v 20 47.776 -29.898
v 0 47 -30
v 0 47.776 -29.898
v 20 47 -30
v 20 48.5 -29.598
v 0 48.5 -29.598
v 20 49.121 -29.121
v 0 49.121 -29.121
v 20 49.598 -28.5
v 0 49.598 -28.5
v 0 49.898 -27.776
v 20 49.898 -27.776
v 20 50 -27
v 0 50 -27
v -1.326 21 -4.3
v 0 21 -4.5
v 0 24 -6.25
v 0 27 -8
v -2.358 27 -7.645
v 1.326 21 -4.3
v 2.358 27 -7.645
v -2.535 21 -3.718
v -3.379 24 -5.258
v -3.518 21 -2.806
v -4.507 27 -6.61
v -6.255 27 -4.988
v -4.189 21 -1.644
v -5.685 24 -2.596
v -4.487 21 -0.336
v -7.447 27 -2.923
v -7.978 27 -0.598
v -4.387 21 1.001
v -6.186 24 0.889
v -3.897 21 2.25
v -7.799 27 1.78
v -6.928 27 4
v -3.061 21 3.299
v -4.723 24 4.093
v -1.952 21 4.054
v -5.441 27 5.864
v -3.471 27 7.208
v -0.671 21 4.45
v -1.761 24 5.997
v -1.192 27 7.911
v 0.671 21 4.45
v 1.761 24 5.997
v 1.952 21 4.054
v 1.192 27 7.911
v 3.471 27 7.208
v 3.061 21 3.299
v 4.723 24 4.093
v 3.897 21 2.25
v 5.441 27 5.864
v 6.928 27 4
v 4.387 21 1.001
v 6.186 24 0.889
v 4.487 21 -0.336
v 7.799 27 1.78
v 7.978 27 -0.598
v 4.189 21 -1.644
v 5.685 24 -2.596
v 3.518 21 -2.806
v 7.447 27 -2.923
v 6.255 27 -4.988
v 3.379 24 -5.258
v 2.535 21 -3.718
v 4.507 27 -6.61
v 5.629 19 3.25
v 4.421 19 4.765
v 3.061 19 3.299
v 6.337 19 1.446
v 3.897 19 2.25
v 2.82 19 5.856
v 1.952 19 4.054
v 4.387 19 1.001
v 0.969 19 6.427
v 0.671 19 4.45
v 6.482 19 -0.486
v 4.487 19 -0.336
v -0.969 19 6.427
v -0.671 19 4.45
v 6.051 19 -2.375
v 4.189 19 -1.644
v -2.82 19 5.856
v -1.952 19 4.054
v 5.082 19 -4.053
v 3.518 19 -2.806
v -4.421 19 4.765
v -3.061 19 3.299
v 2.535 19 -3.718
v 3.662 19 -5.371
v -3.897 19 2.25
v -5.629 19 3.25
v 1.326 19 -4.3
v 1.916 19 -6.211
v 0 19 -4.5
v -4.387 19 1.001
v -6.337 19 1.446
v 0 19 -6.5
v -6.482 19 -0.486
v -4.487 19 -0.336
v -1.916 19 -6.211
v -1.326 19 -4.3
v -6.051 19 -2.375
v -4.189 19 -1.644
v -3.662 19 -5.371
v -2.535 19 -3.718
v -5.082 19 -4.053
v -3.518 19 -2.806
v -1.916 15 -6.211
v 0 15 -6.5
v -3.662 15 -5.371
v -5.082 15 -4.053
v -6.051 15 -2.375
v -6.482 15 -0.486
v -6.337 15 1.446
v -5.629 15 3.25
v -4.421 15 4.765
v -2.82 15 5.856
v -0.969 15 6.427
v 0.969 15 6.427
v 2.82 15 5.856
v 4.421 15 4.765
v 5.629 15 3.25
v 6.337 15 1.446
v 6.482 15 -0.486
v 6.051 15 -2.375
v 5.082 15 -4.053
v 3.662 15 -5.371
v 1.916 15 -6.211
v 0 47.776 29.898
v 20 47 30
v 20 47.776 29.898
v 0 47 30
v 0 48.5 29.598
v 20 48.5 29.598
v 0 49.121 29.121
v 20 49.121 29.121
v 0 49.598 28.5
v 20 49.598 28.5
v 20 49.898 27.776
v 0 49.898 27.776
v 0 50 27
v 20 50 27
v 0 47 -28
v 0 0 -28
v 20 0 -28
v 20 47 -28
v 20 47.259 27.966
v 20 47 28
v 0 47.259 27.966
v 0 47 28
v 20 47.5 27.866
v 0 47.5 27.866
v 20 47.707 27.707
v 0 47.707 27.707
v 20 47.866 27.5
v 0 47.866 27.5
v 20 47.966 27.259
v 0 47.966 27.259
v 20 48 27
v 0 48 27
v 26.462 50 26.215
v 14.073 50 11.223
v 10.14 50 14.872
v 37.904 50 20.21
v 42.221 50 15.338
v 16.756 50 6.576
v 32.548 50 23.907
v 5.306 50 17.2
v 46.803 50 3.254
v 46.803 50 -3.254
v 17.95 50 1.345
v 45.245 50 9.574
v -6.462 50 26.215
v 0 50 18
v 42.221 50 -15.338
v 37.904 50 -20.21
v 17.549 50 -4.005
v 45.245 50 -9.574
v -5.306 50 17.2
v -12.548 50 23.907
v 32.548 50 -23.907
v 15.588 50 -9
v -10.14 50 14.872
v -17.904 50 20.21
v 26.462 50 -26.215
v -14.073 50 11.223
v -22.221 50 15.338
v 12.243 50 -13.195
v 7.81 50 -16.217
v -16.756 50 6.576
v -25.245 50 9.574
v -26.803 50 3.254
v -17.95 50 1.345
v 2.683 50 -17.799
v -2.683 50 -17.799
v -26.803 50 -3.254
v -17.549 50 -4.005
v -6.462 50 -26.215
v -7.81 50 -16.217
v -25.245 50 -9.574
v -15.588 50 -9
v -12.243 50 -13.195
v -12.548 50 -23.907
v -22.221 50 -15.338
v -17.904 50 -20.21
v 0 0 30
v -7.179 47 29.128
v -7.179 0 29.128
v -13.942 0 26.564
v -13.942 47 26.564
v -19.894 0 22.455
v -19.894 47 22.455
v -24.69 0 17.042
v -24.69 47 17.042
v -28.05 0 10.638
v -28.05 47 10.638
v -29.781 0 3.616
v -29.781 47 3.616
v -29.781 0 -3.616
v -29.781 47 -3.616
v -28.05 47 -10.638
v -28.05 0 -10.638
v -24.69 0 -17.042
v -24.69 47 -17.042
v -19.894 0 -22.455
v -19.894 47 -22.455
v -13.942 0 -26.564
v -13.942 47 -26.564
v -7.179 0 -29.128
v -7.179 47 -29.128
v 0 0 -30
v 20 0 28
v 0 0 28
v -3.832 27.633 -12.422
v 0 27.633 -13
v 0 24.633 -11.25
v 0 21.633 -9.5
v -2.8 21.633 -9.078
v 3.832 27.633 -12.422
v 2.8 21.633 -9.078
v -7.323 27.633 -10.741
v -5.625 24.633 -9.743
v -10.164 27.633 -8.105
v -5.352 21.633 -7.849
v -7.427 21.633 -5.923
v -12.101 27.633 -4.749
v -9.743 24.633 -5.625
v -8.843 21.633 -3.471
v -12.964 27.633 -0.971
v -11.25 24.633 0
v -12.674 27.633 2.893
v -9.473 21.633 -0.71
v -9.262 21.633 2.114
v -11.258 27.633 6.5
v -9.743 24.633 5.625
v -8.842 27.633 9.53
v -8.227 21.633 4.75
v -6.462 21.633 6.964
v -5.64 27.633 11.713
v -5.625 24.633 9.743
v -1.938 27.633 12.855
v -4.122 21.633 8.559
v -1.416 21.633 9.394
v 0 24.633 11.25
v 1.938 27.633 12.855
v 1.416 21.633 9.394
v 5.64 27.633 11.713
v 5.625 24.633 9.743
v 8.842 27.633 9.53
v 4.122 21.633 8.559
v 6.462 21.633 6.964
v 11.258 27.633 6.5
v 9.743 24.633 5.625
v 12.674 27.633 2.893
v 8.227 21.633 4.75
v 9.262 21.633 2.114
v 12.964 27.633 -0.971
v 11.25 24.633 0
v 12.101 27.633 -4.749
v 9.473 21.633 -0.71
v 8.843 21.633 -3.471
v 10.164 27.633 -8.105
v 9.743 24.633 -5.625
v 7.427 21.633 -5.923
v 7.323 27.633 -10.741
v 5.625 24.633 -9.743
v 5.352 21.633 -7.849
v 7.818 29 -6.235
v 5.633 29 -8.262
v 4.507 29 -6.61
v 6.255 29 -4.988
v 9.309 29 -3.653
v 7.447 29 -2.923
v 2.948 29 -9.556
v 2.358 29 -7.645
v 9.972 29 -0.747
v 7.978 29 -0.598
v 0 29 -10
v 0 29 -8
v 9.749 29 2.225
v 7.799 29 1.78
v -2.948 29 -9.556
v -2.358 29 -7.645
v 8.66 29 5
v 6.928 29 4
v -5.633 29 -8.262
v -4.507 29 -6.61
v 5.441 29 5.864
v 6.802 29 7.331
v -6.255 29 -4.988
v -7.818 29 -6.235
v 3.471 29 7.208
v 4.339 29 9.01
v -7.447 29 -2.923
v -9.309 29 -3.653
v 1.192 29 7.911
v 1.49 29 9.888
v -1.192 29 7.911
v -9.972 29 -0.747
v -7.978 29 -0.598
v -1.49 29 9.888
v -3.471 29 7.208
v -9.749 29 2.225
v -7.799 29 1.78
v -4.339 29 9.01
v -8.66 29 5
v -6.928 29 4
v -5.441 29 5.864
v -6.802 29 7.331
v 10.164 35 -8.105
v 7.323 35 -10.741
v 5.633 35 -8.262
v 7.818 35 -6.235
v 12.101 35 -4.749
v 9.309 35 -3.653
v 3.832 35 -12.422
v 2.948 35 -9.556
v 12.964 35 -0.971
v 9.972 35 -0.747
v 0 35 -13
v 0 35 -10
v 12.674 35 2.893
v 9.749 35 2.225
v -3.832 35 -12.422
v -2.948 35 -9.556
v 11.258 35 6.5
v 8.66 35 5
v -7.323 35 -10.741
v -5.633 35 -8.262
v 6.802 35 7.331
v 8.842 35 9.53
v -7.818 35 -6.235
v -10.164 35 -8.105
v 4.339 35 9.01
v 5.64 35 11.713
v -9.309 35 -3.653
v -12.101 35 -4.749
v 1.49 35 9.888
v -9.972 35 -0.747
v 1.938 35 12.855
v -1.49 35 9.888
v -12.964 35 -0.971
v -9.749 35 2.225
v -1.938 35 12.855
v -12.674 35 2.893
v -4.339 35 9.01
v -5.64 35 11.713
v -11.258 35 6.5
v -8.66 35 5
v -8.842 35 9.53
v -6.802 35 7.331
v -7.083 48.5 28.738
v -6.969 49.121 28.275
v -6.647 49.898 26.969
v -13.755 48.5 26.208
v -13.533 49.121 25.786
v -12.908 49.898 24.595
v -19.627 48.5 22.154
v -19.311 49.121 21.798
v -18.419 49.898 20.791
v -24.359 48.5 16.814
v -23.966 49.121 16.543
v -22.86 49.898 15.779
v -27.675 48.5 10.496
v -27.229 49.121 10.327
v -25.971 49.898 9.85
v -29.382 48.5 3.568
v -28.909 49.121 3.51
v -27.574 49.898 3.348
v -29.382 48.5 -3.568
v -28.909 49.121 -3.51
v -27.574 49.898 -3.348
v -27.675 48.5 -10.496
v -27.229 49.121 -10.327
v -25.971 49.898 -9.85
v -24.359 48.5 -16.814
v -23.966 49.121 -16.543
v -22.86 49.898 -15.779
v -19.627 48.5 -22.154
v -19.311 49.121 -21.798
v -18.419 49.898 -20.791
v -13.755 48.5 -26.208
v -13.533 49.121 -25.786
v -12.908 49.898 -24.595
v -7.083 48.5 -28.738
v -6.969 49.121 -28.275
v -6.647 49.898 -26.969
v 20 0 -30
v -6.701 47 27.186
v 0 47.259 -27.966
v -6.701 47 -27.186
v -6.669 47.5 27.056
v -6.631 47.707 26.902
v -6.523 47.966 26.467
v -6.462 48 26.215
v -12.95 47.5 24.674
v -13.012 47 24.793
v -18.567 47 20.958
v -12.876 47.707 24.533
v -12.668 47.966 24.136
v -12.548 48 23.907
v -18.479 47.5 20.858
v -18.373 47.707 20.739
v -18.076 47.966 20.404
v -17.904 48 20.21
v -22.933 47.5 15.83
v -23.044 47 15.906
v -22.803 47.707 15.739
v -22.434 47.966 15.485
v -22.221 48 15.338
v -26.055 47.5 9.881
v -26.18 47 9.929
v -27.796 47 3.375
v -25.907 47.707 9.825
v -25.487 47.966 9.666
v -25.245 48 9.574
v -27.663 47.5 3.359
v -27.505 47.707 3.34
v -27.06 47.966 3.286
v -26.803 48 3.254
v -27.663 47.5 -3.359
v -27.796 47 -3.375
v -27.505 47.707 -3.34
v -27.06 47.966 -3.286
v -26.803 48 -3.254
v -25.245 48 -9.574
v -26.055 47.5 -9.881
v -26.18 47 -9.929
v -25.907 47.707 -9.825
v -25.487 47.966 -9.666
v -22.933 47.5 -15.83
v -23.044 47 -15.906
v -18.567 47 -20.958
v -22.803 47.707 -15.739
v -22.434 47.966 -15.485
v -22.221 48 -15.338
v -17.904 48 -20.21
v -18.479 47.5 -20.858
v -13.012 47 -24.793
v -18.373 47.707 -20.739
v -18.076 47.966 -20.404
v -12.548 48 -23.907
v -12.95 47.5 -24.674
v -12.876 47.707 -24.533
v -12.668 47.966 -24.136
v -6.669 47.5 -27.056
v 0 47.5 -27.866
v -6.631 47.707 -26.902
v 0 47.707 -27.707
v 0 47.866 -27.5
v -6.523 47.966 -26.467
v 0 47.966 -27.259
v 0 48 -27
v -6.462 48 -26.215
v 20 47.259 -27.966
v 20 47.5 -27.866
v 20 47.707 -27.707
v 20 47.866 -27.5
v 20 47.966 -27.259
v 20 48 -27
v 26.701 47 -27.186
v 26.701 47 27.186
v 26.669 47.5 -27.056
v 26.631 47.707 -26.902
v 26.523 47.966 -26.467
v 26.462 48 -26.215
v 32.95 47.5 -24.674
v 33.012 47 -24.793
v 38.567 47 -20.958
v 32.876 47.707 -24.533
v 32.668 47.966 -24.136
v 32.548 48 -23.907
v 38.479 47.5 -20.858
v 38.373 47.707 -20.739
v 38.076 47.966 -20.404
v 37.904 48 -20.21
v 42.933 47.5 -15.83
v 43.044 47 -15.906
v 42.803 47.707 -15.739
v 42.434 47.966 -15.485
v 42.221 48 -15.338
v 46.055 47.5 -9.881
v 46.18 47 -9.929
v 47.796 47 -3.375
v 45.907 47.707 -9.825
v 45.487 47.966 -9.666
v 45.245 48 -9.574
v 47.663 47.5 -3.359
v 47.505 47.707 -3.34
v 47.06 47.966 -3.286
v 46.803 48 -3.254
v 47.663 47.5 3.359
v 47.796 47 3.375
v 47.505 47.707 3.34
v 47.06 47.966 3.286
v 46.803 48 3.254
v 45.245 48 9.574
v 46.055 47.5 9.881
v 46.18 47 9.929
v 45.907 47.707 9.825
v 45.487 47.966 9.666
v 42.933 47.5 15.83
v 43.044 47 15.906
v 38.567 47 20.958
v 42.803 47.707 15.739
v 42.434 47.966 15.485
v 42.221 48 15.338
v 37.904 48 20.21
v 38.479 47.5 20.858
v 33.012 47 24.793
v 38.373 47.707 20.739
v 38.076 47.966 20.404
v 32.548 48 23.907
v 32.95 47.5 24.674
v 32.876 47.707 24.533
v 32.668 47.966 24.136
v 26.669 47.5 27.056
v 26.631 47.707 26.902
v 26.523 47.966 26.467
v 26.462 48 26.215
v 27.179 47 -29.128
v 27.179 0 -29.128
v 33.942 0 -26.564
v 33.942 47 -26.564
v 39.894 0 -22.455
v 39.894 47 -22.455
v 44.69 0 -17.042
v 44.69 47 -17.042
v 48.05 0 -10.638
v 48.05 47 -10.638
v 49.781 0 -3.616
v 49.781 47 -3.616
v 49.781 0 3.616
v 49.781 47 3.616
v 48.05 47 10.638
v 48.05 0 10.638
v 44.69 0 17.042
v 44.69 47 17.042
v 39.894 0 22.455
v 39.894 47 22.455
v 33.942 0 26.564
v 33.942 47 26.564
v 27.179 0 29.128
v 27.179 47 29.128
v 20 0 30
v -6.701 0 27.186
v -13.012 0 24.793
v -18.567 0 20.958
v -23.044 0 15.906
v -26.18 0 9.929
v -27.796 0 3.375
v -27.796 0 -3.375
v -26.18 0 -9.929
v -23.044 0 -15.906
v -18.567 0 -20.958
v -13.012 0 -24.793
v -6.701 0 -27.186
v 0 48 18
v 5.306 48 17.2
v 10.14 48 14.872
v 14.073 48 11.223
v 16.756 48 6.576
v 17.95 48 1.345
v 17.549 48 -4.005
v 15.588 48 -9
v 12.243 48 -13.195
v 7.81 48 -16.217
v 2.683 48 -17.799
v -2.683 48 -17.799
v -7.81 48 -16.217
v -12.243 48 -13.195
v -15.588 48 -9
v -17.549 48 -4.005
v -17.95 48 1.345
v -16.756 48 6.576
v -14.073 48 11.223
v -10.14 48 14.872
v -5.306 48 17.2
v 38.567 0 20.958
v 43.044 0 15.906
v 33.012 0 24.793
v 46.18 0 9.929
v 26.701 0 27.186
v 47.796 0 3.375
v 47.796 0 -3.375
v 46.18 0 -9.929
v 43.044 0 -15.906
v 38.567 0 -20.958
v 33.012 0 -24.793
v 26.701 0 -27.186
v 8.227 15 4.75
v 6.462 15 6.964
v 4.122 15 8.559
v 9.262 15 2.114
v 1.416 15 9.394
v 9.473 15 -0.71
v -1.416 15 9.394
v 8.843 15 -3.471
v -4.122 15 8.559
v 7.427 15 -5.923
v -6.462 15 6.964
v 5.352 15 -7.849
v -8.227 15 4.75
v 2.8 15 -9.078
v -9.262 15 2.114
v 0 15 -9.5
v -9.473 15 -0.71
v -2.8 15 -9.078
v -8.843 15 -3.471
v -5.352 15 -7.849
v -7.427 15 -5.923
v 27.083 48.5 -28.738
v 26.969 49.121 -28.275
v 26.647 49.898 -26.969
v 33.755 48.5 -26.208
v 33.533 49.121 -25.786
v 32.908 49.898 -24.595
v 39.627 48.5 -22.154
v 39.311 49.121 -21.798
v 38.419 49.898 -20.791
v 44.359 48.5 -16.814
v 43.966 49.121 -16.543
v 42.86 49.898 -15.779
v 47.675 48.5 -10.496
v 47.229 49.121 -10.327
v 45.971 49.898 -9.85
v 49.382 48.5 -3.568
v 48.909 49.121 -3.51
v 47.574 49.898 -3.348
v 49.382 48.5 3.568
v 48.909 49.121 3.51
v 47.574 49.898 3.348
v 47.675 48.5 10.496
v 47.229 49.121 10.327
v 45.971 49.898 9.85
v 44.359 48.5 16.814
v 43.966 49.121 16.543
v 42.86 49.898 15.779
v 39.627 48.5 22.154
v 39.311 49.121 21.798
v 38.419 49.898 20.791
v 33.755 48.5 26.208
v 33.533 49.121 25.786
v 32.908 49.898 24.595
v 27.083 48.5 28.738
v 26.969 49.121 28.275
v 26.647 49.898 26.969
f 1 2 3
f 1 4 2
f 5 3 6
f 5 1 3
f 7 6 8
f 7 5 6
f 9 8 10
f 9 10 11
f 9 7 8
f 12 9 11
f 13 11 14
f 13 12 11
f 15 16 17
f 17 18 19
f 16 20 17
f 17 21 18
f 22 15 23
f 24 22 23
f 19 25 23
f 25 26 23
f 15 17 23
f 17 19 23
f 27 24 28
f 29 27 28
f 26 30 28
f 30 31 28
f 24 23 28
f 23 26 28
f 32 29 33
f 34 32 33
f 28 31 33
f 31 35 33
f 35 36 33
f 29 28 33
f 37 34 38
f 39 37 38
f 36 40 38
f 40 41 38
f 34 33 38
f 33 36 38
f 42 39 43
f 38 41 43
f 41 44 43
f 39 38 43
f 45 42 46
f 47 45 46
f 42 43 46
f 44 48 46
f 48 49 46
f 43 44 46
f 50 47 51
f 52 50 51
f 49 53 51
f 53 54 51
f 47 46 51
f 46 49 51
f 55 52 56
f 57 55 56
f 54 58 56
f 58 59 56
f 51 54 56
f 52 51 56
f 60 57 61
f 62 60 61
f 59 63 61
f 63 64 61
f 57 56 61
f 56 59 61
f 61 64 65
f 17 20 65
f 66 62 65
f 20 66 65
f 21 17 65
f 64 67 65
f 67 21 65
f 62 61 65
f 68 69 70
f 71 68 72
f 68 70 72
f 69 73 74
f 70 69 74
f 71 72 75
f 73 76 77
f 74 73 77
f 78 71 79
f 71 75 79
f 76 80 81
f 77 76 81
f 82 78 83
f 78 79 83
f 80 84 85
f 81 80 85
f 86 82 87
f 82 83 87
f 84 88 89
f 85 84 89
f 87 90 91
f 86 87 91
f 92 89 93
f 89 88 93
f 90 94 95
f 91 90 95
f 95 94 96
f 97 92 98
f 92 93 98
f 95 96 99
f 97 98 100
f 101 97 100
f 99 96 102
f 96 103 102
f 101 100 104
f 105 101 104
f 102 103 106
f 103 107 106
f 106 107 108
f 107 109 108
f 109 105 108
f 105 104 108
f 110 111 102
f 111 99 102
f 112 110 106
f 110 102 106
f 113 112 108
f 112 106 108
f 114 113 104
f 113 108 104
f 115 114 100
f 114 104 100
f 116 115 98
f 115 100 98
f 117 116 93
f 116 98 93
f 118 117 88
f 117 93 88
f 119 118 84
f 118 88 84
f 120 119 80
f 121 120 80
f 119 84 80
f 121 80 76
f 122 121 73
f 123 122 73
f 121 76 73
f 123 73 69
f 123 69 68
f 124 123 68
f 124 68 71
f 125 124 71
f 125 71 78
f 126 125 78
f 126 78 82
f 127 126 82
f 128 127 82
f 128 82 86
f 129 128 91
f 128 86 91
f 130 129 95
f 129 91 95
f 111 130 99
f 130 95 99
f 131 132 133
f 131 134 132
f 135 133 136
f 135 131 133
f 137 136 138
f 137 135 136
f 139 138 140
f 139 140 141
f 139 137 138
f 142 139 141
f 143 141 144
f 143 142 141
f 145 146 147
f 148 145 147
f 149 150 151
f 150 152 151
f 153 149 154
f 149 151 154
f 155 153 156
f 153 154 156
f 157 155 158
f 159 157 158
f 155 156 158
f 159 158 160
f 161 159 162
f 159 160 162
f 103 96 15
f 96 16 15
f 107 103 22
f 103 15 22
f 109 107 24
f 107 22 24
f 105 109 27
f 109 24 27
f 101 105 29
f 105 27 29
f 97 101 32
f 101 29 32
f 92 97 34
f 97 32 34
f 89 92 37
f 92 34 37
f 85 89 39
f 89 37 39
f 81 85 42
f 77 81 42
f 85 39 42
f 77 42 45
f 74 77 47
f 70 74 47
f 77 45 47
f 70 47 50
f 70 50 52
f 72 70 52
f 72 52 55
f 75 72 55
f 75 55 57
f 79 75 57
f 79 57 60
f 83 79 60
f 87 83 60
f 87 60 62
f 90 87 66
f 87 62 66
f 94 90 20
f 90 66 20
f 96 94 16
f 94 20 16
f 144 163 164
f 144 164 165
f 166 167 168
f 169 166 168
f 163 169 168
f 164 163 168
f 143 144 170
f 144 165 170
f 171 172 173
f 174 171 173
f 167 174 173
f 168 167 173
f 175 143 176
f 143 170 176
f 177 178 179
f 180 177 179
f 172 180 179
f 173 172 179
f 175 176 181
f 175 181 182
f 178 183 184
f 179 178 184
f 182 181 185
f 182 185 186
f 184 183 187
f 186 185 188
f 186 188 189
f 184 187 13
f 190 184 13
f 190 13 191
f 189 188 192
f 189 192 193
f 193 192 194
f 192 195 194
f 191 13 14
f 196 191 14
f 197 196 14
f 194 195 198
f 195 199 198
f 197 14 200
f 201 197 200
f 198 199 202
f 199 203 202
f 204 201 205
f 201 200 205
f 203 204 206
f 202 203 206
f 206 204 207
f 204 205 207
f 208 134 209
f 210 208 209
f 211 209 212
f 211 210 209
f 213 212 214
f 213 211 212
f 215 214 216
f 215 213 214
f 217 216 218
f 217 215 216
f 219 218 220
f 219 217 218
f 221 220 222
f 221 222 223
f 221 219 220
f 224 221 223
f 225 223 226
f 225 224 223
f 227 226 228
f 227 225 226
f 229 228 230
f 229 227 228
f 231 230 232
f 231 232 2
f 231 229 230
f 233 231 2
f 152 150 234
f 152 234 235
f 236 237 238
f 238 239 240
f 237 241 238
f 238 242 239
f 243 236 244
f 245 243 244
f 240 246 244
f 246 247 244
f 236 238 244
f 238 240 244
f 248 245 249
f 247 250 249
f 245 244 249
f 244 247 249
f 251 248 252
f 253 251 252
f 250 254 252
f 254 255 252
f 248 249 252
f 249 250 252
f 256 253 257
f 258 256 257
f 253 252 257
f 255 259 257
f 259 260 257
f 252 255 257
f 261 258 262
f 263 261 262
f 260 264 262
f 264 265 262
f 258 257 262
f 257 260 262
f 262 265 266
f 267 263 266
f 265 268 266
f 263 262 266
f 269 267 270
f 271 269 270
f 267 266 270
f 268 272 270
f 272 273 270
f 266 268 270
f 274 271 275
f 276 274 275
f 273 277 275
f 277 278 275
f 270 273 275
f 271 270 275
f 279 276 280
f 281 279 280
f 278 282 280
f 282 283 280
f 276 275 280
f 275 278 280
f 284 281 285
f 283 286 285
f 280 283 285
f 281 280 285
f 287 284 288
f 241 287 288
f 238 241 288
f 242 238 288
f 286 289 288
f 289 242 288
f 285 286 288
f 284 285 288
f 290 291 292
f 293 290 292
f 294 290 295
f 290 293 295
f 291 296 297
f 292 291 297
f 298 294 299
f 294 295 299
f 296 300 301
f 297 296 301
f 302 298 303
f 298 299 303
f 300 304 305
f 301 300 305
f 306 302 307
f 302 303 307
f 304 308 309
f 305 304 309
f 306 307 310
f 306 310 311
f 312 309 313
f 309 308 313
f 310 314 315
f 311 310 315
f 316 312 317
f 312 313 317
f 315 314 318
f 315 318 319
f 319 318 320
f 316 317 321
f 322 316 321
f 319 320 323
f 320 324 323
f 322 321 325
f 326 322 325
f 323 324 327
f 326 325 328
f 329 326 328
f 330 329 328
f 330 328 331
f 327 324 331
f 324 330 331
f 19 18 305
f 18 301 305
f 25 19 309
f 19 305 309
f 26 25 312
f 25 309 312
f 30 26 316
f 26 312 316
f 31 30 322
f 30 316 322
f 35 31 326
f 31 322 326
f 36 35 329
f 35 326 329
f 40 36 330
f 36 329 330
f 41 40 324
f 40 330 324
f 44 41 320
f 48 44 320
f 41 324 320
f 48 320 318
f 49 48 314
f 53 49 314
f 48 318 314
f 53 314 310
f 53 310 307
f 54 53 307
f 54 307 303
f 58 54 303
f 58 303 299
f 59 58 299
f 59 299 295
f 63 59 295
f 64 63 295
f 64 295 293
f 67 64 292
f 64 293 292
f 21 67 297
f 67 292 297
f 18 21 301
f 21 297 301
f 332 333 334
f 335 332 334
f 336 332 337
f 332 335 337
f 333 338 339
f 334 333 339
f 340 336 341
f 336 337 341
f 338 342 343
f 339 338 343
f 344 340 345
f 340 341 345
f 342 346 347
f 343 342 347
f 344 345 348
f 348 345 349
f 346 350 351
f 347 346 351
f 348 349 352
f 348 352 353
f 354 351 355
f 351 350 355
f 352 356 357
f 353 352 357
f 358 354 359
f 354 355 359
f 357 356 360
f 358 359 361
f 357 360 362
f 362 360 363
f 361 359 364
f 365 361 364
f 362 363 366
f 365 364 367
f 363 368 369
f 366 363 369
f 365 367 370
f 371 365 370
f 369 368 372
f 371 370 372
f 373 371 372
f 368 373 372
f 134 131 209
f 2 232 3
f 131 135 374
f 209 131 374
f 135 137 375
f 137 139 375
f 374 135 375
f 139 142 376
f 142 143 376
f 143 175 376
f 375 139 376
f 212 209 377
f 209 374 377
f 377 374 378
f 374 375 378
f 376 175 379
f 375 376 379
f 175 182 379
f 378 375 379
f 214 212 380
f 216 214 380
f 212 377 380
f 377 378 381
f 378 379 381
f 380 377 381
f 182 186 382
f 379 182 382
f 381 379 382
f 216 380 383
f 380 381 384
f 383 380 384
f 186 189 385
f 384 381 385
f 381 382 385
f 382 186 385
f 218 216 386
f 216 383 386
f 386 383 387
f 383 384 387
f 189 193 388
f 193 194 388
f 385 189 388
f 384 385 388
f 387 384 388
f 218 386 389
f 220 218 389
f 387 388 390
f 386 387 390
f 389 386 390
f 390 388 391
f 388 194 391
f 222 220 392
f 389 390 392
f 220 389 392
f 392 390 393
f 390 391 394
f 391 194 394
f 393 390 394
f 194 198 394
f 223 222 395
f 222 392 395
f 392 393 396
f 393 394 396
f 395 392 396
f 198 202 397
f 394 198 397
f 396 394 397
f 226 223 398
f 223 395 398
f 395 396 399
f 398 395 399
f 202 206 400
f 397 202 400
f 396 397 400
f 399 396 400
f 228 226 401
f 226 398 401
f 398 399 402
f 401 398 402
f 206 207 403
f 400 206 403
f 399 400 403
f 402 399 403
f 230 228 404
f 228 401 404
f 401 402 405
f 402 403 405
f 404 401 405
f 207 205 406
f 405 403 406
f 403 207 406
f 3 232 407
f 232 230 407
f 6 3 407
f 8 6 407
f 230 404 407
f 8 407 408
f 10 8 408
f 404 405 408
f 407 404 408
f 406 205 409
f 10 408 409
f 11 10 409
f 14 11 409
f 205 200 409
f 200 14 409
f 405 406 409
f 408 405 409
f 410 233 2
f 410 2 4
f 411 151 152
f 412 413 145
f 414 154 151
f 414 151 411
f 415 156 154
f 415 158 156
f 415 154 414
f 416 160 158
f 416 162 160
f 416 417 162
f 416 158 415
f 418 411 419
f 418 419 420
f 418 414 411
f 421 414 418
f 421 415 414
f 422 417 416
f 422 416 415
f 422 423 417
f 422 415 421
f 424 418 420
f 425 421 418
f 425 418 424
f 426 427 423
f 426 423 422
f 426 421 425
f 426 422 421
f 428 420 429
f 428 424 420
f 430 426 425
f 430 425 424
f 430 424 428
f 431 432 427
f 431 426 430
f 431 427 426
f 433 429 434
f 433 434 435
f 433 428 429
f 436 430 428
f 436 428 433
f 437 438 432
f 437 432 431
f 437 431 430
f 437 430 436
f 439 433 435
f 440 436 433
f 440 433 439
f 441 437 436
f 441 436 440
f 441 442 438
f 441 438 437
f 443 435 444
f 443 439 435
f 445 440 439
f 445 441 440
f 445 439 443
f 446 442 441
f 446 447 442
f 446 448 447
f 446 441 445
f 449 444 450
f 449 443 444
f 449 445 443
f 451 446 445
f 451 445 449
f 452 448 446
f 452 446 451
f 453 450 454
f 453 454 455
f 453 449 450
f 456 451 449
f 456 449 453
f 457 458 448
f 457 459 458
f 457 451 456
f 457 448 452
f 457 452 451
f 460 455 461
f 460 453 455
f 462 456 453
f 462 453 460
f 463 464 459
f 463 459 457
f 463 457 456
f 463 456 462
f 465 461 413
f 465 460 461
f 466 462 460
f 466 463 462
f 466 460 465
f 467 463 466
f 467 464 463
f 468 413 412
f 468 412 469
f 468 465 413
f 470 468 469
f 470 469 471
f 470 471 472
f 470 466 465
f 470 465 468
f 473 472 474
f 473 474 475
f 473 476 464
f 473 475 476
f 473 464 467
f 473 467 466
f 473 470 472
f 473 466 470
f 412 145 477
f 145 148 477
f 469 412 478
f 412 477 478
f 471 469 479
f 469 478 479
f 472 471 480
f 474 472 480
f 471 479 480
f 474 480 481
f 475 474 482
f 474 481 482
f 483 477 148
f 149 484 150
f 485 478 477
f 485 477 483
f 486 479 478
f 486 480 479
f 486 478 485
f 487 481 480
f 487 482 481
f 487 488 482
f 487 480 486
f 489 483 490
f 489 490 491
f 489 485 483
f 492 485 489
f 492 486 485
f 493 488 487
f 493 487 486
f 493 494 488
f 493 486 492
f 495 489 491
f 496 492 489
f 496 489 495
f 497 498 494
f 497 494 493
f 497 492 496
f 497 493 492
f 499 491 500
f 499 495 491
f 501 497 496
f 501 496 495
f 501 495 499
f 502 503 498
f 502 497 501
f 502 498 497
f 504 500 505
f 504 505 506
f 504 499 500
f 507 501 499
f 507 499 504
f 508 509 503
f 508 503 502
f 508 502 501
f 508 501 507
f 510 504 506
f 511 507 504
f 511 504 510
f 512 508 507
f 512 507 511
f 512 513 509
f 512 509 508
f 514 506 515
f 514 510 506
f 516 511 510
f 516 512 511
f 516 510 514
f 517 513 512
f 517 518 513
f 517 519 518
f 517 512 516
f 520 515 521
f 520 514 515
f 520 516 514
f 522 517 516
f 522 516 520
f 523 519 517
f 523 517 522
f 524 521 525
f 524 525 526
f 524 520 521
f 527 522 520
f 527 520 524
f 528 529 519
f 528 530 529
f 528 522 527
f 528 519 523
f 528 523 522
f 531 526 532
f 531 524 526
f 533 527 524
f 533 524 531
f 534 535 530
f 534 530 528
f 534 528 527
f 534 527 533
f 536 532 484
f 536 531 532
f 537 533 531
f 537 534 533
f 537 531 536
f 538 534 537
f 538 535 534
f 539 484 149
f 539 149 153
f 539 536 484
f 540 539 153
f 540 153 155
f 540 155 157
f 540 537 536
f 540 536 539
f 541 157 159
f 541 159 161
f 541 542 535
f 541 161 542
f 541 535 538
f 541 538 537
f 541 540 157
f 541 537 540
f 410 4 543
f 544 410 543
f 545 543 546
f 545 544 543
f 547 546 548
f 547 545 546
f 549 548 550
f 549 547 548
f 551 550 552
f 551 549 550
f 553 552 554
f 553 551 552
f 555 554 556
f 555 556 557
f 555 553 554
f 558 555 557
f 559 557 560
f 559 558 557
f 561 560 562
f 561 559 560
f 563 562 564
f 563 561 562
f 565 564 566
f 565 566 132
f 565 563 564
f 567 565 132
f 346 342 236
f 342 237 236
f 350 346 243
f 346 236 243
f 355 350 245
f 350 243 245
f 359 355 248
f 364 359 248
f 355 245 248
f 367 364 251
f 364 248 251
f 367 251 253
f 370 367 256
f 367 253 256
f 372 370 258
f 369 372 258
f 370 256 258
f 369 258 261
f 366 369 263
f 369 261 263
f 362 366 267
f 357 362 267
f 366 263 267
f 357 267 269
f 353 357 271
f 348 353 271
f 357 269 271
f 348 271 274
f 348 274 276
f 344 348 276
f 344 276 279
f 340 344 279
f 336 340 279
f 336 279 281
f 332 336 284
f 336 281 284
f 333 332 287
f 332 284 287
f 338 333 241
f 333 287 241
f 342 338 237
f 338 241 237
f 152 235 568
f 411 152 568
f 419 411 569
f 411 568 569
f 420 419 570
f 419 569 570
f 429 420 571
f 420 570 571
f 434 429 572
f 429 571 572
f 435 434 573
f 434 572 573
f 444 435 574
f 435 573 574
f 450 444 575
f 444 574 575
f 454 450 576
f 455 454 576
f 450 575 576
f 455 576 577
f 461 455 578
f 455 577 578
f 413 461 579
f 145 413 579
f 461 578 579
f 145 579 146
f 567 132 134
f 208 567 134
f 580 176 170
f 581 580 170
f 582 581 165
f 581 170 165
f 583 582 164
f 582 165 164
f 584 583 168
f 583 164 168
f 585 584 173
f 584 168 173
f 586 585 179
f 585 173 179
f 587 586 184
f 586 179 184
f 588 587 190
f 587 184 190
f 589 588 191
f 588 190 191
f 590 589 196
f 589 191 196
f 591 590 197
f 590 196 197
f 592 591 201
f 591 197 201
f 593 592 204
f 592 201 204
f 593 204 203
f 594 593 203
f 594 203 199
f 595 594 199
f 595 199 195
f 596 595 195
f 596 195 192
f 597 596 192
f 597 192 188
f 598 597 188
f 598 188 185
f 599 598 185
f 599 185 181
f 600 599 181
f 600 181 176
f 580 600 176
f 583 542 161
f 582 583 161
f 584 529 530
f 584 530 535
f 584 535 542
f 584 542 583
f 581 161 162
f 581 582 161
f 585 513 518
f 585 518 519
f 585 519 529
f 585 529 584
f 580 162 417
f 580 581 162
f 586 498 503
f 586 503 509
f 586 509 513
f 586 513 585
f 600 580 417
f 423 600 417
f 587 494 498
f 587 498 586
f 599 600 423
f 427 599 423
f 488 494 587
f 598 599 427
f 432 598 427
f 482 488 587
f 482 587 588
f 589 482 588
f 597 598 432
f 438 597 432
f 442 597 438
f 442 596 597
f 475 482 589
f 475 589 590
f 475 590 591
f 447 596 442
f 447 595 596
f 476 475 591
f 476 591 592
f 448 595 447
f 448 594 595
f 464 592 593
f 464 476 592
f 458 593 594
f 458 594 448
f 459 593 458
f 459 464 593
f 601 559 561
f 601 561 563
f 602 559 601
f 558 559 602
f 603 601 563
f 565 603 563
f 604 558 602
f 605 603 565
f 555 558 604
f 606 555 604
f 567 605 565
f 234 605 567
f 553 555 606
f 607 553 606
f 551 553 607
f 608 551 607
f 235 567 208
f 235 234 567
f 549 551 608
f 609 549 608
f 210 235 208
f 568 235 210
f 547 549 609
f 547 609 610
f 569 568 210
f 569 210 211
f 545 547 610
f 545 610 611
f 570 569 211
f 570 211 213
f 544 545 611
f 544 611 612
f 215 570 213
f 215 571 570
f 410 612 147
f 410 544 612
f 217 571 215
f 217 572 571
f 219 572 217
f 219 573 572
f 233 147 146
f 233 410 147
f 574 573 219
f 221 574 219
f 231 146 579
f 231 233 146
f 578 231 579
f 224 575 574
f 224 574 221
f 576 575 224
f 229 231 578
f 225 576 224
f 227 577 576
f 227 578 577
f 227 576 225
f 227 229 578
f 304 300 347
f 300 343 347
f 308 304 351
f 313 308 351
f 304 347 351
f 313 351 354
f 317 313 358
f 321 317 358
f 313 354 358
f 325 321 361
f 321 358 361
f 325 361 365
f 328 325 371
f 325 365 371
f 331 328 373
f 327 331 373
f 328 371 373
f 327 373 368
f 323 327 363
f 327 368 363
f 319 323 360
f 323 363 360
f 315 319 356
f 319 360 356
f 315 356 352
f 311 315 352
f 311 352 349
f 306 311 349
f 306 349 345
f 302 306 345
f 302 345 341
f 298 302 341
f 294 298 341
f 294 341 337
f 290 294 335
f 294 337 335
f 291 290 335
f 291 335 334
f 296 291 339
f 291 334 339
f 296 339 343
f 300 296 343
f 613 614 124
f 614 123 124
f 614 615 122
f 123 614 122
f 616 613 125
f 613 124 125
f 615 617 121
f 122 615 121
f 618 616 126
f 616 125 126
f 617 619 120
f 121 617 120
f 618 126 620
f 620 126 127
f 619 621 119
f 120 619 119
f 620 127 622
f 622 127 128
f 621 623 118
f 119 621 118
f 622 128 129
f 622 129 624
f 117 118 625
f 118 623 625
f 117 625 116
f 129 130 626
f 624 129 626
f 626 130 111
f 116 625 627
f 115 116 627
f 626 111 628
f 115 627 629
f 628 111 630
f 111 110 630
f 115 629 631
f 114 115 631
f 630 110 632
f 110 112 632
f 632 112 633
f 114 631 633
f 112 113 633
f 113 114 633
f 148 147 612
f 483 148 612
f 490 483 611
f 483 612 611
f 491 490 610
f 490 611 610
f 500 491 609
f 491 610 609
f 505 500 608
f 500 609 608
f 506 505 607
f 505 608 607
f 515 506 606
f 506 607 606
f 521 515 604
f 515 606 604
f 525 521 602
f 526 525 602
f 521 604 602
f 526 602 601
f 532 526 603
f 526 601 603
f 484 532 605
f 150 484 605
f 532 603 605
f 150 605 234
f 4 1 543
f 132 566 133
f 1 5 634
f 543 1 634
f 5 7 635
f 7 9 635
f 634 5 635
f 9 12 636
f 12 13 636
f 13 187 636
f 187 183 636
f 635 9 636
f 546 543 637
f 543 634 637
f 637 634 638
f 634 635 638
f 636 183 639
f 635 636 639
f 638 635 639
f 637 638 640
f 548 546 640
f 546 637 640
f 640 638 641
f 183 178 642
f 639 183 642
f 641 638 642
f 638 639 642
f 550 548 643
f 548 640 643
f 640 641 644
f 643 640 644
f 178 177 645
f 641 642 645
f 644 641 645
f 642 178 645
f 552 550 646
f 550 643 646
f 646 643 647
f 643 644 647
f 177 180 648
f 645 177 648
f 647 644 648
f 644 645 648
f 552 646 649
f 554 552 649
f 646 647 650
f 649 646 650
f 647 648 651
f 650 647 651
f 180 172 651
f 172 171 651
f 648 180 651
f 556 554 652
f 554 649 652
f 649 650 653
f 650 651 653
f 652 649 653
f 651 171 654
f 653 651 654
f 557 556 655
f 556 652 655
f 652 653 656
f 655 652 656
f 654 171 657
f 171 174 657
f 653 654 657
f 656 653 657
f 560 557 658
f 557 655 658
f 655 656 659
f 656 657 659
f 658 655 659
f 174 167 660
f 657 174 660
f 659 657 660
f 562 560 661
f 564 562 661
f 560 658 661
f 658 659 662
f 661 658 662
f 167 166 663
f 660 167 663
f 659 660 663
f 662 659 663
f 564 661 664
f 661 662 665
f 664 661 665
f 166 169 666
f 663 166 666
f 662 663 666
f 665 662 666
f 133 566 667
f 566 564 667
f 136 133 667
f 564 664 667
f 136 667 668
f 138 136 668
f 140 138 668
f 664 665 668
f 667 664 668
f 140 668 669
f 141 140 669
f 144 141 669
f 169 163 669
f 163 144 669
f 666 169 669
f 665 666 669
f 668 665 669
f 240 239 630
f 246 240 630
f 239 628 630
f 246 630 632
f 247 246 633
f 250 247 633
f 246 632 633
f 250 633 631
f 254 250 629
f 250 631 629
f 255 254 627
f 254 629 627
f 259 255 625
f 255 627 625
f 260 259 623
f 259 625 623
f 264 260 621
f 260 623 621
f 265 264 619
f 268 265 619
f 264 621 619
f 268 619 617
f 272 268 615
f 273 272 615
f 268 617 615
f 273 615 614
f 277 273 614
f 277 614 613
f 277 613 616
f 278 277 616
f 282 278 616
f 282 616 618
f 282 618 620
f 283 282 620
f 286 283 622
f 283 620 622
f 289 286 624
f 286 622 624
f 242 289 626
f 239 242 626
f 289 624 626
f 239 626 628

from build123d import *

# Parameters (mm, degrees)
EXTRUDE_1_DEPTH     = 50
FILLET_1_R          = 3
SHELL_1_T           = -2
CUT_EXTRUDE_1_REACH = 78.811
SKETCH_2_R          = 18


with BuildPart() as part:
    # 草图1 → 凸台-拉伸1 (new body)
    with BuildSketch(Plane(origin=(0, 0, 0), x_dir=(1, 0, 0), z_dir=(0, 1, 0))):
        with BuildLine():
            Line((0, 30), (20, 30))
            ThreePointArc((20, 30), (50, 0), (20, -30))
            Line((20, -30), (0, -30))
            ThreePointArc((0, -30), (-30, 0), (0, 30))
        make_face()
    extrude(amount=EXTRUDE_1_DEPTH)

    # 圆角1
    fillet_1_edges = [part.edges().sort_by_distance(p)[0] for p in [
        (50, 50, 0),
        (10, 50, -30),
        (-30, 50, 0),
        (10, 50, 30),
    ]]
    fillet(fillet_1_edges, radius=FILLET_1_R)

    # 抽壳1
    shell_1_openings = [part.faces().sort_by_distance(p)[0] for p in [
        (10, 0, 0),
    ]]
    offset(amount=SHELL_1_T, openings=shell_1_openings, kind=Kind.INTERSECTION)

    # 草图2 → 切除-拉伸1 (cut, up to next)
    with BuildSketch(Plane(origin=(0, 50, 0), x_dir=(1, 0, 0), z_dir=(0, 1, 0)), mode=Mode.PRIVATE) as cut_extrude_1_sk1:
        with Locations(Location((0, 0, 0), (0, 0, 270))):
            Circle(SKETCH_2_R)
    cut_extrude_1_tool1 = extrude(cut_extrude_1_sk1.sketch, amount=-CUT_EXTRUDE_1_REACH, mode=Mode.PRIVATE) & part.part
    add(cut_extrude_1_tool1.solids().sort_by_distance((0, 50, 0))[0], mode=Mode.SUBTRACT)


with BuildPart() as body_2:
    # 草图3 → 旋转1 (revolve)
    with BuildSketch(Plane.XY, mode=Mode.PRIVATE) as revolve_1_sk:
        Polygon((-10, 35), (-13, 35), (-13, 27.632889149), (-9.5, 21.632889149), (-9.5, 15), (-6.5, 15), (-6.5, 19), (-4.5, 19), (-4.5, 21), (-8, 27), (-8, 29), (-10, 29), align=None)
    revolve(revolve_1_sk.sketch.rotate(Axis((0, 0, 0), (0, 1, 0)), 270), axis=Axis((0, 0, 0), (0, 1, 0)))


solid = Compound([part.part, body_2.part])
